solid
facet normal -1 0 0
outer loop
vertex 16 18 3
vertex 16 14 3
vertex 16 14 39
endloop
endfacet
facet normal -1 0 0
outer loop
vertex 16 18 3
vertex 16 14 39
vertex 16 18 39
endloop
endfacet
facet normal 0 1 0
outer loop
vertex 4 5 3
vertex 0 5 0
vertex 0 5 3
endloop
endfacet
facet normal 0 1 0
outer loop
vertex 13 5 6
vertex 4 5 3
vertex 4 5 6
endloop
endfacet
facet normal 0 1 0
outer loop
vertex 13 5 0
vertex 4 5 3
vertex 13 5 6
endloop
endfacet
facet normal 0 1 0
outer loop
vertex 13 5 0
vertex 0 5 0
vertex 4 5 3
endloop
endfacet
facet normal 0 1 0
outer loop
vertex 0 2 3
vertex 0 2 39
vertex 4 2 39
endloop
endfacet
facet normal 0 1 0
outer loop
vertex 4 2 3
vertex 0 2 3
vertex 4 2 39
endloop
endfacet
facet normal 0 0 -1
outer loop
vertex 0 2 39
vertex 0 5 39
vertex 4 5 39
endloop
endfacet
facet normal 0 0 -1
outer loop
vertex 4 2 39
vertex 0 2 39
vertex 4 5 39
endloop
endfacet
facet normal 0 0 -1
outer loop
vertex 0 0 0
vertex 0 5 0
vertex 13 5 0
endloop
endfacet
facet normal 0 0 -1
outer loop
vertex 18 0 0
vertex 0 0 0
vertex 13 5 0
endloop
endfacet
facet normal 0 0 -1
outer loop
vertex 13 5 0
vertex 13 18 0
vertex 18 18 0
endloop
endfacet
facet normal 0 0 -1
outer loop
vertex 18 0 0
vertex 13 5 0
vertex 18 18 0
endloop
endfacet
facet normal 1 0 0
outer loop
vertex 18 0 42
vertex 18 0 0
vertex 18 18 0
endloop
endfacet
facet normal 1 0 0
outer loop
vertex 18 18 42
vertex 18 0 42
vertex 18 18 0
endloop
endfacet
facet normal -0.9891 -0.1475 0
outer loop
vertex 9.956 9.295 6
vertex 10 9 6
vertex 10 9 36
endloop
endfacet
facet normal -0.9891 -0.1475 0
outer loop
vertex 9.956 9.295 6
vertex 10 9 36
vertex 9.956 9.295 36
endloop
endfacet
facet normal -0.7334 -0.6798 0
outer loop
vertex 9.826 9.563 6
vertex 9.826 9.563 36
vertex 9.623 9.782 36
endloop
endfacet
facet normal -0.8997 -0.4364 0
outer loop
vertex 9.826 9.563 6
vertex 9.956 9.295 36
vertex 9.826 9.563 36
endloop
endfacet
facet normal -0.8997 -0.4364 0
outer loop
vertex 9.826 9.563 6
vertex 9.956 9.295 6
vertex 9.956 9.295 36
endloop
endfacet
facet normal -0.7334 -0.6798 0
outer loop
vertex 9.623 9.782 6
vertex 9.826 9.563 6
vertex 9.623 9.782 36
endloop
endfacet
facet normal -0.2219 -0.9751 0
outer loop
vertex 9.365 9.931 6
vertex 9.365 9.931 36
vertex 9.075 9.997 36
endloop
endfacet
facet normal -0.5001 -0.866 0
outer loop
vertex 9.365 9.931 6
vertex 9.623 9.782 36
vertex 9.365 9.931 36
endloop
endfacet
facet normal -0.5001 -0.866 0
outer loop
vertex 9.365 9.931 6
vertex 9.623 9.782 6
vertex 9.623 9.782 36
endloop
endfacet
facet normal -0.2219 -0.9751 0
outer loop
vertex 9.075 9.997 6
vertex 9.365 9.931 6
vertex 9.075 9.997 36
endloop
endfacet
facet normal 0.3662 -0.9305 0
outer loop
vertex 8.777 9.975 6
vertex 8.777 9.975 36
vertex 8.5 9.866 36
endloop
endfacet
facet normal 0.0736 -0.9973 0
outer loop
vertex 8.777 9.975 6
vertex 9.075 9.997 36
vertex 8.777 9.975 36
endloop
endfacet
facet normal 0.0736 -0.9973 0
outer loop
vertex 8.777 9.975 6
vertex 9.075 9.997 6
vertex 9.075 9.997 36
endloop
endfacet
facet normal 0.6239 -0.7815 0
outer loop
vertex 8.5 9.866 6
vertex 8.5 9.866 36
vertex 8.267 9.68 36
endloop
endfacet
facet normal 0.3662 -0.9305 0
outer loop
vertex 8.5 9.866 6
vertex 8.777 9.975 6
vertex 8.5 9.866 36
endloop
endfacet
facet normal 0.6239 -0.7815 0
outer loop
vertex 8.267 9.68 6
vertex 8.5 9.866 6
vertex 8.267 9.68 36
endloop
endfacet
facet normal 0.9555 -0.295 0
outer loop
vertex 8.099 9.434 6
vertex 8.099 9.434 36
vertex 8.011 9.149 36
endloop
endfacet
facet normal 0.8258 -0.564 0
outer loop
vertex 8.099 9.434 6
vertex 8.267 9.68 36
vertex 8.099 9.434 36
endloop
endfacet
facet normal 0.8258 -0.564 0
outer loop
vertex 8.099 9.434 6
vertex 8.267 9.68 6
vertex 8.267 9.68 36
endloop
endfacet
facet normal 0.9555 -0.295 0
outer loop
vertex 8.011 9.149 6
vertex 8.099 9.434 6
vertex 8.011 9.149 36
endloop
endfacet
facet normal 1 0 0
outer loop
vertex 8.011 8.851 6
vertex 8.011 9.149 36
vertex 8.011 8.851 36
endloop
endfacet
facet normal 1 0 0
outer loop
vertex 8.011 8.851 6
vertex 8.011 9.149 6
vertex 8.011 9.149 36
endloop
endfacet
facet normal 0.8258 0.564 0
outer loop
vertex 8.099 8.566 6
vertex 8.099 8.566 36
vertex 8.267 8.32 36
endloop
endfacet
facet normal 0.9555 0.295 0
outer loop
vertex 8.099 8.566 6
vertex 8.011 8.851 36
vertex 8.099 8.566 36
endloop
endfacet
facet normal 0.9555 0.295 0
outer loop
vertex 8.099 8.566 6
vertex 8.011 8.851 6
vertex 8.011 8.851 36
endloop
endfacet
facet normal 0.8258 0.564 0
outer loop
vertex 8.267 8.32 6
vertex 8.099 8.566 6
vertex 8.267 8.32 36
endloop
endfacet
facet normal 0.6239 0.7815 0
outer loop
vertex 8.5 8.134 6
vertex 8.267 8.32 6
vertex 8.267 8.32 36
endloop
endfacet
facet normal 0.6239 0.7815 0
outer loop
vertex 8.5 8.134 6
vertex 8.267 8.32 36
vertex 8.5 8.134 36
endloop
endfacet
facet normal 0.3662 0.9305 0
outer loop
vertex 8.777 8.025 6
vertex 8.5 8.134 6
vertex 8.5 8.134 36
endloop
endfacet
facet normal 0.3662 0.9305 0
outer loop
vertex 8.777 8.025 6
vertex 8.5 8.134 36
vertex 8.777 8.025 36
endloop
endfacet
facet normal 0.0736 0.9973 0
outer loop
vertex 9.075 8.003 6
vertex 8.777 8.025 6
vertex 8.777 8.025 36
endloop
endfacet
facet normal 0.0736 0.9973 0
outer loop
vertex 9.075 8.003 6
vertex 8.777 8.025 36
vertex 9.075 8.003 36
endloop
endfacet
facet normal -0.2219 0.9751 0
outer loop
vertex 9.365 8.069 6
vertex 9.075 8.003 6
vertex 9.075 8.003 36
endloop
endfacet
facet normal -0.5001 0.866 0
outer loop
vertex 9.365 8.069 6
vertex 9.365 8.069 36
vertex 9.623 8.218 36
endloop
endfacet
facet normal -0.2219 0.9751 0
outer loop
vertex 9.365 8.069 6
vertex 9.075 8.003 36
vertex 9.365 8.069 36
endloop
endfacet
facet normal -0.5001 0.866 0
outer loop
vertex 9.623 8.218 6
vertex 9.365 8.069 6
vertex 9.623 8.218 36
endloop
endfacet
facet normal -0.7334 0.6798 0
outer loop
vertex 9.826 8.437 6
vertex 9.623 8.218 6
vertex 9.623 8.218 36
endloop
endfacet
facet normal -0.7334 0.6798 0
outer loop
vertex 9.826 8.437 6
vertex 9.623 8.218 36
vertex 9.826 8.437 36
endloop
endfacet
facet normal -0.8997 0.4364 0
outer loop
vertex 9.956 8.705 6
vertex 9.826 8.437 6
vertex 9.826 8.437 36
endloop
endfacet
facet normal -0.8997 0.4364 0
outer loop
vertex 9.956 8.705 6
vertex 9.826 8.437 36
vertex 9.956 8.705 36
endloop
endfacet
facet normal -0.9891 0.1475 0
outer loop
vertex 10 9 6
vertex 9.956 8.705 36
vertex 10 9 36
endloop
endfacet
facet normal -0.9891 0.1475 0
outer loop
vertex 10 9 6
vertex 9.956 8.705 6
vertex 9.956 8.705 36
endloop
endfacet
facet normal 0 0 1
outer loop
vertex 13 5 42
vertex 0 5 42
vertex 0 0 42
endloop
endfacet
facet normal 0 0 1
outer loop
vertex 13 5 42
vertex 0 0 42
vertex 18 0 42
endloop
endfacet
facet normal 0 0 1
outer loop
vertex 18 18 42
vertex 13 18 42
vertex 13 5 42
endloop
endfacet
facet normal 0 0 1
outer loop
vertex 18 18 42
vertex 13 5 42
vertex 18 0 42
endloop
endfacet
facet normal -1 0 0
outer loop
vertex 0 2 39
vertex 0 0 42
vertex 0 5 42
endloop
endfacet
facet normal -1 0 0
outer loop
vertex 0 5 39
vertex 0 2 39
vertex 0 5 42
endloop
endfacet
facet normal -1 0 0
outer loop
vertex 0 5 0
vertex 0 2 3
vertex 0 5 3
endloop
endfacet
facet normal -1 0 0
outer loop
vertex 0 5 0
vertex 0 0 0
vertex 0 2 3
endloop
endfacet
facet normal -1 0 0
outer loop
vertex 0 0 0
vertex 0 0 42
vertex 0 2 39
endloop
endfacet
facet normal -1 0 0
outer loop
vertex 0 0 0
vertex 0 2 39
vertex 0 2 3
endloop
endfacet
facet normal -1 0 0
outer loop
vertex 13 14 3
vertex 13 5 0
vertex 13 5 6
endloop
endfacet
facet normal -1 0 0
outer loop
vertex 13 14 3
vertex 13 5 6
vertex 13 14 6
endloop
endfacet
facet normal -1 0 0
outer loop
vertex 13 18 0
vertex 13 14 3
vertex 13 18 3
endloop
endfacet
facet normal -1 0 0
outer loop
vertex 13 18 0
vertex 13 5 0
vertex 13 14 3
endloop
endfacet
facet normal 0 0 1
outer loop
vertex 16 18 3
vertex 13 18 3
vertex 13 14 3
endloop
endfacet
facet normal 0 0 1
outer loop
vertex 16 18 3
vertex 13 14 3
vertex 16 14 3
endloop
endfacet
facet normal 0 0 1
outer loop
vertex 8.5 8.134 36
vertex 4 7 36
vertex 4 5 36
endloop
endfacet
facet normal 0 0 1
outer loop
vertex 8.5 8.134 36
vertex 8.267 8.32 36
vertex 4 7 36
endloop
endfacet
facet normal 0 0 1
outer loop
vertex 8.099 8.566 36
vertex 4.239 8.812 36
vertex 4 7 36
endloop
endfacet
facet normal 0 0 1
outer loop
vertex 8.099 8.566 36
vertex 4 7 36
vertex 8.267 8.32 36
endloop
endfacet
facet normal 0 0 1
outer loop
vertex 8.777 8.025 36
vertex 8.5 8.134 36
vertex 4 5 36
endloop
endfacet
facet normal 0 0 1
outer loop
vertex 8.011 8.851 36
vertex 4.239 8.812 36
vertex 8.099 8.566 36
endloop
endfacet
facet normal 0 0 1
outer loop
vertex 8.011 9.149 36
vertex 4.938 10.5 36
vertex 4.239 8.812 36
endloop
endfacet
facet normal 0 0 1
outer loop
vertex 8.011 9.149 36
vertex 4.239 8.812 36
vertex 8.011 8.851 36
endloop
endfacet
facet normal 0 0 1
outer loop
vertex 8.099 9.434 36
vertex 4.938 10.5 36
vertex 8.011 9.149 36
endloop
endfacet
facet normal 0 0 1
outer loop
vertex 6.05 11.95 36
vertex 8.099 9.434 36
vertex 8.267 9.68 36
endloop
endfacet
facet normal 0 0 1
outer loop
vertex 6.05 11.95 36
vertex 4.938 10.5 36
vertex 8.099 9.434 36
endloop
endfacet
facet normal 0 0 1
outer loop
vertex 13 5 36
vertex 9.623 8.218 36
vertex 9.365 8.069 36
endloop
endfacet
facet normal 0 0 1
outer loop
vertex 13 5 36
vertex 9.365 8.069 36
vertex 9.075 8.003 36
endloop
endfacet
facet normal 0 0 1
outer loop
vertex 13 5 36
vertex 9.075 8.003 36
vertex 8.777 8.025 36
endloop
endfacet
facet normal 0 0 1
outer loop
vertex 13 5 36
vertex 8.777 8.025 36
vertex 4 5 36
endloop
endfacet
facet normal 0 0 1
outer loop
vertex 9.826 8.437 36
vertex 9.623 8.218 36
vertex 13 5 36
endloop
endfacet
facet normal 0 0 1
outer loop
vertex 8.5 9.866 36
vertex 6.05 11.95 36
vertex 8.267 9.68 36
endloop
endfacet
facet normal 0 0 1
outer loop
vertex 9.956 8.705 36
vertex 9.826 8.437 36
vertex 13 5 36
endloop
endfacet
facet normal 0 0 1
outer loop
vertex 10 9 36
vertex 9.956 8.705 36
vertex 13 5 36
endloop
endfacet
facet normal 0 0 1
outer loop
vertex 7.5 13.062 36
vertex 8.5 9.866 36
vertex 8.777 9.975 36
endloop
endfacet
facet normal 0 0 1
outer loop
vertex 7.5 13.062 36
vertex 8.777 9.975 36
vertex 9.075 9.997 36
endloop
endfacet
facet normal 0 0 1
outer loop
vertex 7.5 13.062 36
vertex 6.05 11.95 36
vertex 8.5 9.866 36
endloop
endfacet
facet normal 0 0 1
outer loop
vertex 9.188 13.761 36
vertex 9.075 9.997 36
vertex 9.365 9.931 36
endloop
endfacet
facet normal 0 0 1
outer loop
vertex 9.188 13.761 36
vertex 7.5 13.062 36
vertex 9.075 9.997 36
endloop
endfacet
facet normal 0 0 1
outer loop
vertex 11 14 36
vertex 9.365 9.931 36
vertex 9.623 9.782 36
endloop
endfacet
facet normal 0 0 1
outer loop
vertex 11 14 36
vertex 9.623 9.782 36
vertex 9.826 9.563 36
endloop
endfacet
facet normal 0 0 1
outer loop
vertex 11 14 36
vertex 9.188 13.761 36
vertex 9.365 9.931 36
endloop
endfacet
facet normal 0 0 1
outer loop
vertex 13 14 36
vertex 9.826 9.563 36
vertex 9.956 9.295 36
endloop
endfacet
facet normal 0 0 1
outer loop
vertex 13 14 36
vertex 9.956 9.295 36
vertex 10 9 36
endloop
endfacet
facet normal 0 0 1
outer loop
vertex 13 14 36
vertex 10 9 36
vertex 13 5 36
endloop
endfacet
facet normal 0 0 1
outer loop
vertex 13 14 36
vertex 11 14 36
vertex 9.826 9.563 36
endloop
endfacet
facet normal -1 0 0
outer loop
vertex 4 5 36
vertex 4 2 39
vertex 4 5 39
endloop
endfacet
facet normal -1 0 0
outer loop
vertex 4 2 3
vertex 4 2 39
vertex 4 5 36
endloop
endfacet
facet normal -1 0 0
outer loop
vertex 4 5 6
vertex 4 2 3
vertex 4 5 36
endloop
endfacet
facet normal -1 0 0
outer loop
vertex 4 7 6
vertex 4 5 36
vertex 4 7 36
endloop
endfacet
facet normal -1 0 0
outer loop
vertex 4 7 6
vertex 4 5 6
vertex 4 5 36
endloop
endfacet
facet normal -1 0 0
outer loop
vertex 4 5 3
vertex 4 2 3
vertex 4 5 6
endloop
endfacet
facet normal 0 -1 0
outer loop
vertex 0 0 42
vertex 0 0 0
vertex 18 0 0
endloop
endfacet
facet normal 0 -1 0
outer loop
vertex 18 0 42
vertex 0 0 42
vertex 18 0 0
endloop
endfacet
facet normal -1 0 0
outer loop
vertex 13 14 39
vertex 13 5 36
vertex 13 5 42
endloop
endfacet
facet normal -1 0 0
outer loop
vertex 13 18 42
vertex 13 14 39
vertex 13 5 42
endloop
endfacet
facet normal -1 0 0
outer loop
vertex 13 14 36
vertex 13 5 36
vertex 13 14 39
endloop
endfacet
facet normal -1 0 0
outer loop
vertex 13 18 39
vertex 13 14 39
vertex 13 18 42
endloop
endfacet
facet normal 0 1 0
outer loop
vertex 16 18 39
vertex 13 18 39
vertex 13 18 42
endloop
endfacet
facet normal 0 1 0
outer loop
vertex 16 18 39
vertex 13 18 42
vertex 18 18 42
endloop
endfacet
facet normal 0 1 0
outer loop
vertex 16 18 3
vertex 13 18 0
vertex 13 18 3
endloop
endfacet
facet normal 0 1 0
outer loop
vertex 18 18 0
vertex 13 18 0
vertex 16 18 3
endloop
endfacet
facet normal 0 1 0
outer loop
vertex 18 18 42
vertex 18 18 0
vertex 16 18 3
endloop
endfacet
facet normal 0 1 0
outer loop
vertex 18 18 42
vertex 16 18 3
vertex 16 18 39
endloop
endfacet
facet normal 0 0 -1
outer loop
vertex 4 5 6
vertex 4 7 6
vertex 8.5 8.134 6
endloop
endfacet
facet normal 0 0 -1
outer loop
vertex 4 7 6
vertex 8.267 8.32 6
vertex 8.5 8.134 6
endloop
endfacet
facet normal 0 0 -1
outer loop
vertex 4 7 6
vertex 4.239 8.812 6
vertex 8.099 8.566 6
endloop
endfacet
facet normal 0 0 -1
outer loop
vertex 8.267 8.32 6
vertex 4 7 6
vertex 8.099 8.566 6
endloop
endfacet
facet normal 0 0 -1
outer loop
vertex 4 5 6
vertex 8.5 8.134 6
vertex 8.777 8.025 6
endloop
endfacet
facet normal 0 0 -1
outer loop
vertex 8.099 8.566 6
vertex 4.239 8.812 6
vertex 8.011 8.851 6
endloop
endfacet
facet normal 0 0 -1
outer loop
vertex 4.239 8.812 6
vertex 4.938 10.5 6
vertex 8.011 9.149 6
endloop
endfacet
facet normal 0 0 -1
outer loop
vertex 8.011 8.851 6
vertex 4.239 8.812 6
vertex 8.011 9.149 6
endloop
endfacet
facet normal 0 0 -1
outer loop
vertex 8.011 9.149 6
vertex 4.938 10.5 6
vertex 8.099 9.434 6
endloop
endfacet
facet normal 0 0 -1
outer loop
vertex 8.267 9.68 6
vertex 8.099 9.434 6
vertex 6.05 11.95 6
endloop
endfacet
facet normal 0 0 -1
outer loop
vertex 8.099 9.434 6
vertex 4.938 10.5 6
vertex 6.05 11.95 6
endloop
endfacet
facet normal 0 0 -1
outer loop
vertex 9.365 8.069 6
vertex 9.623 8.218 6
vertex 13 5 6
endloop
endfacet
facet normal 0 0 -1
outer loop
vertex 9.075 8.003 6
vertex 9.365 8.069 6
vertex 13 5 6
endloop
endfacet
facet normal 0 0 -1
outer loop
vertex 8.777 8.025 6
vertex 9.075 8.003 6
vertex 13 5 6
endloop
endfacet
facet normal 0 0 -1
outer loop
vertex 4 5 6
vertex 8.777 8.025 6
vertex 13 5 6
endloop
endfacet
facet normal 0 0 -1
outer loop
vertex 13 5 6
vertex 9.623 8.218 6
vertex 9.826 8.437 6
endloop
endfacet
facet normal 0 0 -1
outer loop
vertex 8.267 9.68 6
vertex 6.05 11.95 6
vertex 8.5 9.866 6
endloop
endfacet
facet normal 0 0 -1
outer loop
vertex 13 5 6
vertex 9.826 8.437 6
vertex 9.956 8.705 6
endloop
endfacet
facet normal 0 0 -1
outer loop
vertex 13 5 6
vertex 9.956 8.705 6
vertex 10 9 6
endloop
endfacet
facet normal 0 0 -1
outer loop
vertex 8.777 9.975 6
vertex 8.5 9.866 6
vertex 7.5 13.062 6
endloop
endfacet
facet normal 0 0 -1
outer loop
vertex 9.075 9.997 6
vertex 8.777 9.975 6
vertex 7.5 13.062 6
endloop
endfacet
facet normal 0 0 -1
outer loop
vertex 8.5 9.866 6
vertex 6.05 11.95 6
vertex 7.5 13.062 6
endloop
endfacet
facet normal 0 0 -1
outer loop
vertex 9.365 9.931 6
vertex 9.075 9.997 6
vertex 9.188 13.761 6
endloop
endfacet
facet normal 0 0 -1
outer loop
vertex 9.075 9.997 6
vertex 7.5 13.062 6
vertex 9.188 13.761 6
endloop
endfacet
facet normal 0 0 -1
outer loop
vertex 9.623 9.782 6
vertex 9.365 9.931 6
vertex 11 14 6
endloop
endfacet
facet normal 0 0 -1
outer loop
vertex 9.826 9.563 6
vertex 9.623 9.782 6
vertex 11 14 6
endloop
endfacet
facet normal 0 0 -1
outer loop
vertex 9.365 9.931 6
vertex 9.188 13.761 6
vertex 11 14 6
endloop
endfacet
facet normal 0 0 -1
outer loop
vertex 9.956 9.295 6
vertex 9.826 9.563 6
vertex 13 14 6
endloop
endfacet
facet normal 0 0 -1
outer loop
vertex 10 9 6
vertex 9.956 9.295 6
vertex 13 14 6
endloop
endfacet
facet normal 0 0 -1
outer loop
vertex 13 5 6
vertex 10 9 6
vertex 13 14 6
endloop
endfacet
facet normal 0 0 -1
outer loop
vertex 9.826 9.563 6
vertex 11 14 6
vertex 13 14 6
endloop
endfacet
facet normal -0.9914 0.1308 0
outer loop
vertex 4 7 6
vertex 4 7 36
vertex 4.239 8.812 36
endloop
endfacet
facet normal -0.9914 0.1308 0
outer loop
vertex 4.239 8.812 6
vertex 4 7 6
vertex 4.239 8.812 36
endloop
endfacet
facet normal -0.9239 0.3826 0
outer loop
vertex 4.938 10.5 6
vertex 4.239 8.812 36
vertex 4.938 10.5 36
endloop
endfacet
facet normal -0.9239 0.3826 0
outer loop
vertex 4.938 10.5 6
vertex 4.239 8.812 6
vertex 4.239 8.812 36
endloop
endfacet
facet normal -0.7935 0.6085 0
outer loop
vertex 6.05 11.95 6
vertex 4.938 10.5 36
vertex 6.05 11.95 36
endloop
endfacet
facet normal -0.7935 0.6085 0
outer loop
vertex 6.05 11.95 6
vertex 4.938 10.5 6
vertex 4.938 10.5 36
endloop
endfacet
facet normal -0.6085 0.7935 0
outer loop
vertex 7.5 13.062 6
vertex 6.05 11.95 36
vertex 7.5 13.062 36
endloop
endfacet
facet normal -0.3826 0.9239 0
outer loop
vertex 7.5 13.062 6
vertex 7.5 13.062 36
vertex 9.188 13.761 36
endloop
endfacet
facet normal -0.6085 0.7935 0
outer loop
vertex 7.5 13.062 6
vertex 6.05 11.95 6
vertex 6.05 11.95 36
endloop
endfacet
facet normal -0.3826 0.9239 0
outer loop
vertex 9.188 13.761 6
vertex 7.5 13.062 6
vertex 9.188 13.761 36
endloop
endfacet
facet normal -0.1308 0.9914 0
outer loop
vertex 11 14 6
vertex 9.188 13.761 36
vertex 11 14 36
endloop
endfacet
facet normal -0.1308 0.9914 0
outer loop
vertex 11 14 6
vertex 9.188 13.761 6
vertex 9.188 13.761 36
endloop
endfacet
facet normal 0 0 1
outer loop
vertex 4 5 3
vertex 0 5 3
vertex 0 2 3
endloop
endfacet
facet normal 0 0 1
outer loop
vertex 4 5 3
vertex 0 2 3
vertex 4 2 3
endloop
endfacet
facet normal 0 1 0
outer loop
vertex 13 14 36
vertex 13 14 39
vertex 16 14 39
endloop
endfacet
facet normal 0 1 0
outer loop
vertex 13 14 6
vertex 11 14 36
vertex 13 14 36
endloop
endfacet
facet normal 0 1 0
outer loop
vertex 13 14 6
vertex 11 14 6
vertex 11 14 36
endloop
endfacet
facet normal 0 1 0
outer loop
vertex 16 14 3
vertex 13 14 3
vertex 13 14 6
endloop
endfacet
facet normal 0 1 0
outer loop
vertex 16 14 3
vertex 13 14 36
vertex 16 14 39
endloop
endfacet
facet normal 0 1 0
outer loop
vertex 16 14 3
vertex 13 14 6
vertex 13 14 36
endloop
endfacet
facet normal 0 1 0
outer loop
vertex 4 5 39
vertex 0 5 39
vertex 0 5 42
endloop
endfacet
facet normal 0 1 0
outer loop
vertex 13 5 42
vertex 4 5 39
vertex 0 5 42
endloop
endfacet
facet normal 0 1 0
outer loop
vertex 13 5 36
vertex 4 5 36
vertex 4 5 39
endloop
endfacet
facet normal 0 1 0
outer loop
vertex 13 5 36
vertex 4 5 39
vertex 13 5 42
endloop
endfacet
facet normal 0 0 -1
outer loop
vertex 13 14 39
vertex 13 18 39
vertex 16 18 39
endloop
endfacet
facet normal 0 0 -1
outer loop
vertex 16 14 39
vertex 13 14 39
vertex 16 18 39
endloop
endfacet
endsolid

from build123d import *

# Parameters (mm, degrees)
BOX017_W          = 18
BOX017_H          = 18
BOX017_DEPTH      = 36
CYLINDER010_R     = 1
CYLINDER010_DEPTH = 70
BOX015_W          = 18
BOX015_H          = 18
BOX015_DEPTH      = 6
ARRAY007_Z_COUNT  = 2
ARRAY007_Z_PITCH  = 36
BOX016_W          = 18
BOX016_H          = 18
BOX016_DEPTH      = 36
BOX014_W          = 18
BOX014_H          = 18
BOX014_DEPTH      = 42
FILLET001_R       = 7


with BuildPart() as cube017:
    # Box017 → Box017 (new body)
    with BuildSketch(Plane(origin=(-2, 14, 3), x_dir=(1, 0, 0), z_dir=(0, 0, 1))):
        with Locations((9, 9)):
            Rectangle(BOX017_W, BOX017_H)
    extrude(amount=BOX017_DEPTH)


with BuildPart() as cylinder010:
    # Cylinder010 → Cylinder010 (new body)
    with BuildSketch(Plane(origin=(9, 9, -17), x_dir=(1, 0, 0), z_dir=(0, 0, 1))):
        Circle(CYLINDER010_R)
    extrude(amount=CYLINDER010_DEPTH)


with BuildPart() as array007:
    # Box015 → Box015 (new body)
    with BuildSketch(Plane(origin=(-5, 5, 0), x_dir=(1, 0, 0), z_dir=(0, 0, 1))):
        with Locations((9, 9)):
            Rectangle(BOX015_W, BOX015_H)
    extrude(amount=BOX015_DEPTH)

    # Array007 Z: Array007 ×2


with BuildPart() as array007_1:
    add(array007.part)
    with Locations(*[(0, 0, i * ARRAY007_Z_PITCH) for i in range(1, ARRAY007_Z_COUNT)]):
        add(array007.part)


with BuildPart() as cone002:
    # Cone002 → Cone002 (revolve)
    with BuildSketch(Plane(origin=(9, 9, 0), x_dir=(1, 0, 0), z_dir=(0, -1, 0))):
        Polygon((0, 0), (2.9, 0), (1.5, 3.5), (0, 3.5), align=None)
    revolve(axis=Axis((9, 9, 0), (0, 0, 1)))


with BuildPart() as cone003:
    # Cone003 → Cone003 (revolve)
    with BuildSketch(Plane(origin=(9, 9, 38.5), x_dir=(1, 0, 0), z_dir=(0, -1, 0))):
        Polygon((0, 0), (1.5, 0), (2.9, 3.5), (0, 3.5), align=None)
    revolve(axis=Axis((9, 9, 38.5), (0, 0, 1)))


with BuildPart() as fusion006:
    # Box016 → Box016 (new body)
    with BuildSketch(Plane(origin=(-14, 2, 3), x_dir=(1, 0, 0), z_dir=(0, 0, 1))):
        with Locations((9, 9)):
            Rectangle(BOX016_W, BOX016_H)
    extrude(amount=BOX016_DEPTH)

    # Fusion006: union Cube017, Cylinder010, Array007, Cone002, Cone003
    add(cube017.part)
    add(cylinder010.part)
    add(array007_1.part)
    add(cone002.part)
    add(cone003.part)


with BuildPart() as fillet001:
    # Box014 → Box014 (new body)
    with BuildSketch(Plane.XY):
        with Locations((9, 9)):
            Rectangle(BOX014_W, BOX014_H)
    extrude(amount=BOX014_DEPTH)

    # Cut007: cut Fusion006
    add(fusion006.part, mode=Mode.SUBTRACT)

    # Fillet001
    fillet001_edges = [fillet001.edges().sort_by_distance(p)[0] for p in [
        (4, 14, 21),
    ]]
    fillet(fillet001_edges, radius=FILLET001_R)


solid = fillet001.part
